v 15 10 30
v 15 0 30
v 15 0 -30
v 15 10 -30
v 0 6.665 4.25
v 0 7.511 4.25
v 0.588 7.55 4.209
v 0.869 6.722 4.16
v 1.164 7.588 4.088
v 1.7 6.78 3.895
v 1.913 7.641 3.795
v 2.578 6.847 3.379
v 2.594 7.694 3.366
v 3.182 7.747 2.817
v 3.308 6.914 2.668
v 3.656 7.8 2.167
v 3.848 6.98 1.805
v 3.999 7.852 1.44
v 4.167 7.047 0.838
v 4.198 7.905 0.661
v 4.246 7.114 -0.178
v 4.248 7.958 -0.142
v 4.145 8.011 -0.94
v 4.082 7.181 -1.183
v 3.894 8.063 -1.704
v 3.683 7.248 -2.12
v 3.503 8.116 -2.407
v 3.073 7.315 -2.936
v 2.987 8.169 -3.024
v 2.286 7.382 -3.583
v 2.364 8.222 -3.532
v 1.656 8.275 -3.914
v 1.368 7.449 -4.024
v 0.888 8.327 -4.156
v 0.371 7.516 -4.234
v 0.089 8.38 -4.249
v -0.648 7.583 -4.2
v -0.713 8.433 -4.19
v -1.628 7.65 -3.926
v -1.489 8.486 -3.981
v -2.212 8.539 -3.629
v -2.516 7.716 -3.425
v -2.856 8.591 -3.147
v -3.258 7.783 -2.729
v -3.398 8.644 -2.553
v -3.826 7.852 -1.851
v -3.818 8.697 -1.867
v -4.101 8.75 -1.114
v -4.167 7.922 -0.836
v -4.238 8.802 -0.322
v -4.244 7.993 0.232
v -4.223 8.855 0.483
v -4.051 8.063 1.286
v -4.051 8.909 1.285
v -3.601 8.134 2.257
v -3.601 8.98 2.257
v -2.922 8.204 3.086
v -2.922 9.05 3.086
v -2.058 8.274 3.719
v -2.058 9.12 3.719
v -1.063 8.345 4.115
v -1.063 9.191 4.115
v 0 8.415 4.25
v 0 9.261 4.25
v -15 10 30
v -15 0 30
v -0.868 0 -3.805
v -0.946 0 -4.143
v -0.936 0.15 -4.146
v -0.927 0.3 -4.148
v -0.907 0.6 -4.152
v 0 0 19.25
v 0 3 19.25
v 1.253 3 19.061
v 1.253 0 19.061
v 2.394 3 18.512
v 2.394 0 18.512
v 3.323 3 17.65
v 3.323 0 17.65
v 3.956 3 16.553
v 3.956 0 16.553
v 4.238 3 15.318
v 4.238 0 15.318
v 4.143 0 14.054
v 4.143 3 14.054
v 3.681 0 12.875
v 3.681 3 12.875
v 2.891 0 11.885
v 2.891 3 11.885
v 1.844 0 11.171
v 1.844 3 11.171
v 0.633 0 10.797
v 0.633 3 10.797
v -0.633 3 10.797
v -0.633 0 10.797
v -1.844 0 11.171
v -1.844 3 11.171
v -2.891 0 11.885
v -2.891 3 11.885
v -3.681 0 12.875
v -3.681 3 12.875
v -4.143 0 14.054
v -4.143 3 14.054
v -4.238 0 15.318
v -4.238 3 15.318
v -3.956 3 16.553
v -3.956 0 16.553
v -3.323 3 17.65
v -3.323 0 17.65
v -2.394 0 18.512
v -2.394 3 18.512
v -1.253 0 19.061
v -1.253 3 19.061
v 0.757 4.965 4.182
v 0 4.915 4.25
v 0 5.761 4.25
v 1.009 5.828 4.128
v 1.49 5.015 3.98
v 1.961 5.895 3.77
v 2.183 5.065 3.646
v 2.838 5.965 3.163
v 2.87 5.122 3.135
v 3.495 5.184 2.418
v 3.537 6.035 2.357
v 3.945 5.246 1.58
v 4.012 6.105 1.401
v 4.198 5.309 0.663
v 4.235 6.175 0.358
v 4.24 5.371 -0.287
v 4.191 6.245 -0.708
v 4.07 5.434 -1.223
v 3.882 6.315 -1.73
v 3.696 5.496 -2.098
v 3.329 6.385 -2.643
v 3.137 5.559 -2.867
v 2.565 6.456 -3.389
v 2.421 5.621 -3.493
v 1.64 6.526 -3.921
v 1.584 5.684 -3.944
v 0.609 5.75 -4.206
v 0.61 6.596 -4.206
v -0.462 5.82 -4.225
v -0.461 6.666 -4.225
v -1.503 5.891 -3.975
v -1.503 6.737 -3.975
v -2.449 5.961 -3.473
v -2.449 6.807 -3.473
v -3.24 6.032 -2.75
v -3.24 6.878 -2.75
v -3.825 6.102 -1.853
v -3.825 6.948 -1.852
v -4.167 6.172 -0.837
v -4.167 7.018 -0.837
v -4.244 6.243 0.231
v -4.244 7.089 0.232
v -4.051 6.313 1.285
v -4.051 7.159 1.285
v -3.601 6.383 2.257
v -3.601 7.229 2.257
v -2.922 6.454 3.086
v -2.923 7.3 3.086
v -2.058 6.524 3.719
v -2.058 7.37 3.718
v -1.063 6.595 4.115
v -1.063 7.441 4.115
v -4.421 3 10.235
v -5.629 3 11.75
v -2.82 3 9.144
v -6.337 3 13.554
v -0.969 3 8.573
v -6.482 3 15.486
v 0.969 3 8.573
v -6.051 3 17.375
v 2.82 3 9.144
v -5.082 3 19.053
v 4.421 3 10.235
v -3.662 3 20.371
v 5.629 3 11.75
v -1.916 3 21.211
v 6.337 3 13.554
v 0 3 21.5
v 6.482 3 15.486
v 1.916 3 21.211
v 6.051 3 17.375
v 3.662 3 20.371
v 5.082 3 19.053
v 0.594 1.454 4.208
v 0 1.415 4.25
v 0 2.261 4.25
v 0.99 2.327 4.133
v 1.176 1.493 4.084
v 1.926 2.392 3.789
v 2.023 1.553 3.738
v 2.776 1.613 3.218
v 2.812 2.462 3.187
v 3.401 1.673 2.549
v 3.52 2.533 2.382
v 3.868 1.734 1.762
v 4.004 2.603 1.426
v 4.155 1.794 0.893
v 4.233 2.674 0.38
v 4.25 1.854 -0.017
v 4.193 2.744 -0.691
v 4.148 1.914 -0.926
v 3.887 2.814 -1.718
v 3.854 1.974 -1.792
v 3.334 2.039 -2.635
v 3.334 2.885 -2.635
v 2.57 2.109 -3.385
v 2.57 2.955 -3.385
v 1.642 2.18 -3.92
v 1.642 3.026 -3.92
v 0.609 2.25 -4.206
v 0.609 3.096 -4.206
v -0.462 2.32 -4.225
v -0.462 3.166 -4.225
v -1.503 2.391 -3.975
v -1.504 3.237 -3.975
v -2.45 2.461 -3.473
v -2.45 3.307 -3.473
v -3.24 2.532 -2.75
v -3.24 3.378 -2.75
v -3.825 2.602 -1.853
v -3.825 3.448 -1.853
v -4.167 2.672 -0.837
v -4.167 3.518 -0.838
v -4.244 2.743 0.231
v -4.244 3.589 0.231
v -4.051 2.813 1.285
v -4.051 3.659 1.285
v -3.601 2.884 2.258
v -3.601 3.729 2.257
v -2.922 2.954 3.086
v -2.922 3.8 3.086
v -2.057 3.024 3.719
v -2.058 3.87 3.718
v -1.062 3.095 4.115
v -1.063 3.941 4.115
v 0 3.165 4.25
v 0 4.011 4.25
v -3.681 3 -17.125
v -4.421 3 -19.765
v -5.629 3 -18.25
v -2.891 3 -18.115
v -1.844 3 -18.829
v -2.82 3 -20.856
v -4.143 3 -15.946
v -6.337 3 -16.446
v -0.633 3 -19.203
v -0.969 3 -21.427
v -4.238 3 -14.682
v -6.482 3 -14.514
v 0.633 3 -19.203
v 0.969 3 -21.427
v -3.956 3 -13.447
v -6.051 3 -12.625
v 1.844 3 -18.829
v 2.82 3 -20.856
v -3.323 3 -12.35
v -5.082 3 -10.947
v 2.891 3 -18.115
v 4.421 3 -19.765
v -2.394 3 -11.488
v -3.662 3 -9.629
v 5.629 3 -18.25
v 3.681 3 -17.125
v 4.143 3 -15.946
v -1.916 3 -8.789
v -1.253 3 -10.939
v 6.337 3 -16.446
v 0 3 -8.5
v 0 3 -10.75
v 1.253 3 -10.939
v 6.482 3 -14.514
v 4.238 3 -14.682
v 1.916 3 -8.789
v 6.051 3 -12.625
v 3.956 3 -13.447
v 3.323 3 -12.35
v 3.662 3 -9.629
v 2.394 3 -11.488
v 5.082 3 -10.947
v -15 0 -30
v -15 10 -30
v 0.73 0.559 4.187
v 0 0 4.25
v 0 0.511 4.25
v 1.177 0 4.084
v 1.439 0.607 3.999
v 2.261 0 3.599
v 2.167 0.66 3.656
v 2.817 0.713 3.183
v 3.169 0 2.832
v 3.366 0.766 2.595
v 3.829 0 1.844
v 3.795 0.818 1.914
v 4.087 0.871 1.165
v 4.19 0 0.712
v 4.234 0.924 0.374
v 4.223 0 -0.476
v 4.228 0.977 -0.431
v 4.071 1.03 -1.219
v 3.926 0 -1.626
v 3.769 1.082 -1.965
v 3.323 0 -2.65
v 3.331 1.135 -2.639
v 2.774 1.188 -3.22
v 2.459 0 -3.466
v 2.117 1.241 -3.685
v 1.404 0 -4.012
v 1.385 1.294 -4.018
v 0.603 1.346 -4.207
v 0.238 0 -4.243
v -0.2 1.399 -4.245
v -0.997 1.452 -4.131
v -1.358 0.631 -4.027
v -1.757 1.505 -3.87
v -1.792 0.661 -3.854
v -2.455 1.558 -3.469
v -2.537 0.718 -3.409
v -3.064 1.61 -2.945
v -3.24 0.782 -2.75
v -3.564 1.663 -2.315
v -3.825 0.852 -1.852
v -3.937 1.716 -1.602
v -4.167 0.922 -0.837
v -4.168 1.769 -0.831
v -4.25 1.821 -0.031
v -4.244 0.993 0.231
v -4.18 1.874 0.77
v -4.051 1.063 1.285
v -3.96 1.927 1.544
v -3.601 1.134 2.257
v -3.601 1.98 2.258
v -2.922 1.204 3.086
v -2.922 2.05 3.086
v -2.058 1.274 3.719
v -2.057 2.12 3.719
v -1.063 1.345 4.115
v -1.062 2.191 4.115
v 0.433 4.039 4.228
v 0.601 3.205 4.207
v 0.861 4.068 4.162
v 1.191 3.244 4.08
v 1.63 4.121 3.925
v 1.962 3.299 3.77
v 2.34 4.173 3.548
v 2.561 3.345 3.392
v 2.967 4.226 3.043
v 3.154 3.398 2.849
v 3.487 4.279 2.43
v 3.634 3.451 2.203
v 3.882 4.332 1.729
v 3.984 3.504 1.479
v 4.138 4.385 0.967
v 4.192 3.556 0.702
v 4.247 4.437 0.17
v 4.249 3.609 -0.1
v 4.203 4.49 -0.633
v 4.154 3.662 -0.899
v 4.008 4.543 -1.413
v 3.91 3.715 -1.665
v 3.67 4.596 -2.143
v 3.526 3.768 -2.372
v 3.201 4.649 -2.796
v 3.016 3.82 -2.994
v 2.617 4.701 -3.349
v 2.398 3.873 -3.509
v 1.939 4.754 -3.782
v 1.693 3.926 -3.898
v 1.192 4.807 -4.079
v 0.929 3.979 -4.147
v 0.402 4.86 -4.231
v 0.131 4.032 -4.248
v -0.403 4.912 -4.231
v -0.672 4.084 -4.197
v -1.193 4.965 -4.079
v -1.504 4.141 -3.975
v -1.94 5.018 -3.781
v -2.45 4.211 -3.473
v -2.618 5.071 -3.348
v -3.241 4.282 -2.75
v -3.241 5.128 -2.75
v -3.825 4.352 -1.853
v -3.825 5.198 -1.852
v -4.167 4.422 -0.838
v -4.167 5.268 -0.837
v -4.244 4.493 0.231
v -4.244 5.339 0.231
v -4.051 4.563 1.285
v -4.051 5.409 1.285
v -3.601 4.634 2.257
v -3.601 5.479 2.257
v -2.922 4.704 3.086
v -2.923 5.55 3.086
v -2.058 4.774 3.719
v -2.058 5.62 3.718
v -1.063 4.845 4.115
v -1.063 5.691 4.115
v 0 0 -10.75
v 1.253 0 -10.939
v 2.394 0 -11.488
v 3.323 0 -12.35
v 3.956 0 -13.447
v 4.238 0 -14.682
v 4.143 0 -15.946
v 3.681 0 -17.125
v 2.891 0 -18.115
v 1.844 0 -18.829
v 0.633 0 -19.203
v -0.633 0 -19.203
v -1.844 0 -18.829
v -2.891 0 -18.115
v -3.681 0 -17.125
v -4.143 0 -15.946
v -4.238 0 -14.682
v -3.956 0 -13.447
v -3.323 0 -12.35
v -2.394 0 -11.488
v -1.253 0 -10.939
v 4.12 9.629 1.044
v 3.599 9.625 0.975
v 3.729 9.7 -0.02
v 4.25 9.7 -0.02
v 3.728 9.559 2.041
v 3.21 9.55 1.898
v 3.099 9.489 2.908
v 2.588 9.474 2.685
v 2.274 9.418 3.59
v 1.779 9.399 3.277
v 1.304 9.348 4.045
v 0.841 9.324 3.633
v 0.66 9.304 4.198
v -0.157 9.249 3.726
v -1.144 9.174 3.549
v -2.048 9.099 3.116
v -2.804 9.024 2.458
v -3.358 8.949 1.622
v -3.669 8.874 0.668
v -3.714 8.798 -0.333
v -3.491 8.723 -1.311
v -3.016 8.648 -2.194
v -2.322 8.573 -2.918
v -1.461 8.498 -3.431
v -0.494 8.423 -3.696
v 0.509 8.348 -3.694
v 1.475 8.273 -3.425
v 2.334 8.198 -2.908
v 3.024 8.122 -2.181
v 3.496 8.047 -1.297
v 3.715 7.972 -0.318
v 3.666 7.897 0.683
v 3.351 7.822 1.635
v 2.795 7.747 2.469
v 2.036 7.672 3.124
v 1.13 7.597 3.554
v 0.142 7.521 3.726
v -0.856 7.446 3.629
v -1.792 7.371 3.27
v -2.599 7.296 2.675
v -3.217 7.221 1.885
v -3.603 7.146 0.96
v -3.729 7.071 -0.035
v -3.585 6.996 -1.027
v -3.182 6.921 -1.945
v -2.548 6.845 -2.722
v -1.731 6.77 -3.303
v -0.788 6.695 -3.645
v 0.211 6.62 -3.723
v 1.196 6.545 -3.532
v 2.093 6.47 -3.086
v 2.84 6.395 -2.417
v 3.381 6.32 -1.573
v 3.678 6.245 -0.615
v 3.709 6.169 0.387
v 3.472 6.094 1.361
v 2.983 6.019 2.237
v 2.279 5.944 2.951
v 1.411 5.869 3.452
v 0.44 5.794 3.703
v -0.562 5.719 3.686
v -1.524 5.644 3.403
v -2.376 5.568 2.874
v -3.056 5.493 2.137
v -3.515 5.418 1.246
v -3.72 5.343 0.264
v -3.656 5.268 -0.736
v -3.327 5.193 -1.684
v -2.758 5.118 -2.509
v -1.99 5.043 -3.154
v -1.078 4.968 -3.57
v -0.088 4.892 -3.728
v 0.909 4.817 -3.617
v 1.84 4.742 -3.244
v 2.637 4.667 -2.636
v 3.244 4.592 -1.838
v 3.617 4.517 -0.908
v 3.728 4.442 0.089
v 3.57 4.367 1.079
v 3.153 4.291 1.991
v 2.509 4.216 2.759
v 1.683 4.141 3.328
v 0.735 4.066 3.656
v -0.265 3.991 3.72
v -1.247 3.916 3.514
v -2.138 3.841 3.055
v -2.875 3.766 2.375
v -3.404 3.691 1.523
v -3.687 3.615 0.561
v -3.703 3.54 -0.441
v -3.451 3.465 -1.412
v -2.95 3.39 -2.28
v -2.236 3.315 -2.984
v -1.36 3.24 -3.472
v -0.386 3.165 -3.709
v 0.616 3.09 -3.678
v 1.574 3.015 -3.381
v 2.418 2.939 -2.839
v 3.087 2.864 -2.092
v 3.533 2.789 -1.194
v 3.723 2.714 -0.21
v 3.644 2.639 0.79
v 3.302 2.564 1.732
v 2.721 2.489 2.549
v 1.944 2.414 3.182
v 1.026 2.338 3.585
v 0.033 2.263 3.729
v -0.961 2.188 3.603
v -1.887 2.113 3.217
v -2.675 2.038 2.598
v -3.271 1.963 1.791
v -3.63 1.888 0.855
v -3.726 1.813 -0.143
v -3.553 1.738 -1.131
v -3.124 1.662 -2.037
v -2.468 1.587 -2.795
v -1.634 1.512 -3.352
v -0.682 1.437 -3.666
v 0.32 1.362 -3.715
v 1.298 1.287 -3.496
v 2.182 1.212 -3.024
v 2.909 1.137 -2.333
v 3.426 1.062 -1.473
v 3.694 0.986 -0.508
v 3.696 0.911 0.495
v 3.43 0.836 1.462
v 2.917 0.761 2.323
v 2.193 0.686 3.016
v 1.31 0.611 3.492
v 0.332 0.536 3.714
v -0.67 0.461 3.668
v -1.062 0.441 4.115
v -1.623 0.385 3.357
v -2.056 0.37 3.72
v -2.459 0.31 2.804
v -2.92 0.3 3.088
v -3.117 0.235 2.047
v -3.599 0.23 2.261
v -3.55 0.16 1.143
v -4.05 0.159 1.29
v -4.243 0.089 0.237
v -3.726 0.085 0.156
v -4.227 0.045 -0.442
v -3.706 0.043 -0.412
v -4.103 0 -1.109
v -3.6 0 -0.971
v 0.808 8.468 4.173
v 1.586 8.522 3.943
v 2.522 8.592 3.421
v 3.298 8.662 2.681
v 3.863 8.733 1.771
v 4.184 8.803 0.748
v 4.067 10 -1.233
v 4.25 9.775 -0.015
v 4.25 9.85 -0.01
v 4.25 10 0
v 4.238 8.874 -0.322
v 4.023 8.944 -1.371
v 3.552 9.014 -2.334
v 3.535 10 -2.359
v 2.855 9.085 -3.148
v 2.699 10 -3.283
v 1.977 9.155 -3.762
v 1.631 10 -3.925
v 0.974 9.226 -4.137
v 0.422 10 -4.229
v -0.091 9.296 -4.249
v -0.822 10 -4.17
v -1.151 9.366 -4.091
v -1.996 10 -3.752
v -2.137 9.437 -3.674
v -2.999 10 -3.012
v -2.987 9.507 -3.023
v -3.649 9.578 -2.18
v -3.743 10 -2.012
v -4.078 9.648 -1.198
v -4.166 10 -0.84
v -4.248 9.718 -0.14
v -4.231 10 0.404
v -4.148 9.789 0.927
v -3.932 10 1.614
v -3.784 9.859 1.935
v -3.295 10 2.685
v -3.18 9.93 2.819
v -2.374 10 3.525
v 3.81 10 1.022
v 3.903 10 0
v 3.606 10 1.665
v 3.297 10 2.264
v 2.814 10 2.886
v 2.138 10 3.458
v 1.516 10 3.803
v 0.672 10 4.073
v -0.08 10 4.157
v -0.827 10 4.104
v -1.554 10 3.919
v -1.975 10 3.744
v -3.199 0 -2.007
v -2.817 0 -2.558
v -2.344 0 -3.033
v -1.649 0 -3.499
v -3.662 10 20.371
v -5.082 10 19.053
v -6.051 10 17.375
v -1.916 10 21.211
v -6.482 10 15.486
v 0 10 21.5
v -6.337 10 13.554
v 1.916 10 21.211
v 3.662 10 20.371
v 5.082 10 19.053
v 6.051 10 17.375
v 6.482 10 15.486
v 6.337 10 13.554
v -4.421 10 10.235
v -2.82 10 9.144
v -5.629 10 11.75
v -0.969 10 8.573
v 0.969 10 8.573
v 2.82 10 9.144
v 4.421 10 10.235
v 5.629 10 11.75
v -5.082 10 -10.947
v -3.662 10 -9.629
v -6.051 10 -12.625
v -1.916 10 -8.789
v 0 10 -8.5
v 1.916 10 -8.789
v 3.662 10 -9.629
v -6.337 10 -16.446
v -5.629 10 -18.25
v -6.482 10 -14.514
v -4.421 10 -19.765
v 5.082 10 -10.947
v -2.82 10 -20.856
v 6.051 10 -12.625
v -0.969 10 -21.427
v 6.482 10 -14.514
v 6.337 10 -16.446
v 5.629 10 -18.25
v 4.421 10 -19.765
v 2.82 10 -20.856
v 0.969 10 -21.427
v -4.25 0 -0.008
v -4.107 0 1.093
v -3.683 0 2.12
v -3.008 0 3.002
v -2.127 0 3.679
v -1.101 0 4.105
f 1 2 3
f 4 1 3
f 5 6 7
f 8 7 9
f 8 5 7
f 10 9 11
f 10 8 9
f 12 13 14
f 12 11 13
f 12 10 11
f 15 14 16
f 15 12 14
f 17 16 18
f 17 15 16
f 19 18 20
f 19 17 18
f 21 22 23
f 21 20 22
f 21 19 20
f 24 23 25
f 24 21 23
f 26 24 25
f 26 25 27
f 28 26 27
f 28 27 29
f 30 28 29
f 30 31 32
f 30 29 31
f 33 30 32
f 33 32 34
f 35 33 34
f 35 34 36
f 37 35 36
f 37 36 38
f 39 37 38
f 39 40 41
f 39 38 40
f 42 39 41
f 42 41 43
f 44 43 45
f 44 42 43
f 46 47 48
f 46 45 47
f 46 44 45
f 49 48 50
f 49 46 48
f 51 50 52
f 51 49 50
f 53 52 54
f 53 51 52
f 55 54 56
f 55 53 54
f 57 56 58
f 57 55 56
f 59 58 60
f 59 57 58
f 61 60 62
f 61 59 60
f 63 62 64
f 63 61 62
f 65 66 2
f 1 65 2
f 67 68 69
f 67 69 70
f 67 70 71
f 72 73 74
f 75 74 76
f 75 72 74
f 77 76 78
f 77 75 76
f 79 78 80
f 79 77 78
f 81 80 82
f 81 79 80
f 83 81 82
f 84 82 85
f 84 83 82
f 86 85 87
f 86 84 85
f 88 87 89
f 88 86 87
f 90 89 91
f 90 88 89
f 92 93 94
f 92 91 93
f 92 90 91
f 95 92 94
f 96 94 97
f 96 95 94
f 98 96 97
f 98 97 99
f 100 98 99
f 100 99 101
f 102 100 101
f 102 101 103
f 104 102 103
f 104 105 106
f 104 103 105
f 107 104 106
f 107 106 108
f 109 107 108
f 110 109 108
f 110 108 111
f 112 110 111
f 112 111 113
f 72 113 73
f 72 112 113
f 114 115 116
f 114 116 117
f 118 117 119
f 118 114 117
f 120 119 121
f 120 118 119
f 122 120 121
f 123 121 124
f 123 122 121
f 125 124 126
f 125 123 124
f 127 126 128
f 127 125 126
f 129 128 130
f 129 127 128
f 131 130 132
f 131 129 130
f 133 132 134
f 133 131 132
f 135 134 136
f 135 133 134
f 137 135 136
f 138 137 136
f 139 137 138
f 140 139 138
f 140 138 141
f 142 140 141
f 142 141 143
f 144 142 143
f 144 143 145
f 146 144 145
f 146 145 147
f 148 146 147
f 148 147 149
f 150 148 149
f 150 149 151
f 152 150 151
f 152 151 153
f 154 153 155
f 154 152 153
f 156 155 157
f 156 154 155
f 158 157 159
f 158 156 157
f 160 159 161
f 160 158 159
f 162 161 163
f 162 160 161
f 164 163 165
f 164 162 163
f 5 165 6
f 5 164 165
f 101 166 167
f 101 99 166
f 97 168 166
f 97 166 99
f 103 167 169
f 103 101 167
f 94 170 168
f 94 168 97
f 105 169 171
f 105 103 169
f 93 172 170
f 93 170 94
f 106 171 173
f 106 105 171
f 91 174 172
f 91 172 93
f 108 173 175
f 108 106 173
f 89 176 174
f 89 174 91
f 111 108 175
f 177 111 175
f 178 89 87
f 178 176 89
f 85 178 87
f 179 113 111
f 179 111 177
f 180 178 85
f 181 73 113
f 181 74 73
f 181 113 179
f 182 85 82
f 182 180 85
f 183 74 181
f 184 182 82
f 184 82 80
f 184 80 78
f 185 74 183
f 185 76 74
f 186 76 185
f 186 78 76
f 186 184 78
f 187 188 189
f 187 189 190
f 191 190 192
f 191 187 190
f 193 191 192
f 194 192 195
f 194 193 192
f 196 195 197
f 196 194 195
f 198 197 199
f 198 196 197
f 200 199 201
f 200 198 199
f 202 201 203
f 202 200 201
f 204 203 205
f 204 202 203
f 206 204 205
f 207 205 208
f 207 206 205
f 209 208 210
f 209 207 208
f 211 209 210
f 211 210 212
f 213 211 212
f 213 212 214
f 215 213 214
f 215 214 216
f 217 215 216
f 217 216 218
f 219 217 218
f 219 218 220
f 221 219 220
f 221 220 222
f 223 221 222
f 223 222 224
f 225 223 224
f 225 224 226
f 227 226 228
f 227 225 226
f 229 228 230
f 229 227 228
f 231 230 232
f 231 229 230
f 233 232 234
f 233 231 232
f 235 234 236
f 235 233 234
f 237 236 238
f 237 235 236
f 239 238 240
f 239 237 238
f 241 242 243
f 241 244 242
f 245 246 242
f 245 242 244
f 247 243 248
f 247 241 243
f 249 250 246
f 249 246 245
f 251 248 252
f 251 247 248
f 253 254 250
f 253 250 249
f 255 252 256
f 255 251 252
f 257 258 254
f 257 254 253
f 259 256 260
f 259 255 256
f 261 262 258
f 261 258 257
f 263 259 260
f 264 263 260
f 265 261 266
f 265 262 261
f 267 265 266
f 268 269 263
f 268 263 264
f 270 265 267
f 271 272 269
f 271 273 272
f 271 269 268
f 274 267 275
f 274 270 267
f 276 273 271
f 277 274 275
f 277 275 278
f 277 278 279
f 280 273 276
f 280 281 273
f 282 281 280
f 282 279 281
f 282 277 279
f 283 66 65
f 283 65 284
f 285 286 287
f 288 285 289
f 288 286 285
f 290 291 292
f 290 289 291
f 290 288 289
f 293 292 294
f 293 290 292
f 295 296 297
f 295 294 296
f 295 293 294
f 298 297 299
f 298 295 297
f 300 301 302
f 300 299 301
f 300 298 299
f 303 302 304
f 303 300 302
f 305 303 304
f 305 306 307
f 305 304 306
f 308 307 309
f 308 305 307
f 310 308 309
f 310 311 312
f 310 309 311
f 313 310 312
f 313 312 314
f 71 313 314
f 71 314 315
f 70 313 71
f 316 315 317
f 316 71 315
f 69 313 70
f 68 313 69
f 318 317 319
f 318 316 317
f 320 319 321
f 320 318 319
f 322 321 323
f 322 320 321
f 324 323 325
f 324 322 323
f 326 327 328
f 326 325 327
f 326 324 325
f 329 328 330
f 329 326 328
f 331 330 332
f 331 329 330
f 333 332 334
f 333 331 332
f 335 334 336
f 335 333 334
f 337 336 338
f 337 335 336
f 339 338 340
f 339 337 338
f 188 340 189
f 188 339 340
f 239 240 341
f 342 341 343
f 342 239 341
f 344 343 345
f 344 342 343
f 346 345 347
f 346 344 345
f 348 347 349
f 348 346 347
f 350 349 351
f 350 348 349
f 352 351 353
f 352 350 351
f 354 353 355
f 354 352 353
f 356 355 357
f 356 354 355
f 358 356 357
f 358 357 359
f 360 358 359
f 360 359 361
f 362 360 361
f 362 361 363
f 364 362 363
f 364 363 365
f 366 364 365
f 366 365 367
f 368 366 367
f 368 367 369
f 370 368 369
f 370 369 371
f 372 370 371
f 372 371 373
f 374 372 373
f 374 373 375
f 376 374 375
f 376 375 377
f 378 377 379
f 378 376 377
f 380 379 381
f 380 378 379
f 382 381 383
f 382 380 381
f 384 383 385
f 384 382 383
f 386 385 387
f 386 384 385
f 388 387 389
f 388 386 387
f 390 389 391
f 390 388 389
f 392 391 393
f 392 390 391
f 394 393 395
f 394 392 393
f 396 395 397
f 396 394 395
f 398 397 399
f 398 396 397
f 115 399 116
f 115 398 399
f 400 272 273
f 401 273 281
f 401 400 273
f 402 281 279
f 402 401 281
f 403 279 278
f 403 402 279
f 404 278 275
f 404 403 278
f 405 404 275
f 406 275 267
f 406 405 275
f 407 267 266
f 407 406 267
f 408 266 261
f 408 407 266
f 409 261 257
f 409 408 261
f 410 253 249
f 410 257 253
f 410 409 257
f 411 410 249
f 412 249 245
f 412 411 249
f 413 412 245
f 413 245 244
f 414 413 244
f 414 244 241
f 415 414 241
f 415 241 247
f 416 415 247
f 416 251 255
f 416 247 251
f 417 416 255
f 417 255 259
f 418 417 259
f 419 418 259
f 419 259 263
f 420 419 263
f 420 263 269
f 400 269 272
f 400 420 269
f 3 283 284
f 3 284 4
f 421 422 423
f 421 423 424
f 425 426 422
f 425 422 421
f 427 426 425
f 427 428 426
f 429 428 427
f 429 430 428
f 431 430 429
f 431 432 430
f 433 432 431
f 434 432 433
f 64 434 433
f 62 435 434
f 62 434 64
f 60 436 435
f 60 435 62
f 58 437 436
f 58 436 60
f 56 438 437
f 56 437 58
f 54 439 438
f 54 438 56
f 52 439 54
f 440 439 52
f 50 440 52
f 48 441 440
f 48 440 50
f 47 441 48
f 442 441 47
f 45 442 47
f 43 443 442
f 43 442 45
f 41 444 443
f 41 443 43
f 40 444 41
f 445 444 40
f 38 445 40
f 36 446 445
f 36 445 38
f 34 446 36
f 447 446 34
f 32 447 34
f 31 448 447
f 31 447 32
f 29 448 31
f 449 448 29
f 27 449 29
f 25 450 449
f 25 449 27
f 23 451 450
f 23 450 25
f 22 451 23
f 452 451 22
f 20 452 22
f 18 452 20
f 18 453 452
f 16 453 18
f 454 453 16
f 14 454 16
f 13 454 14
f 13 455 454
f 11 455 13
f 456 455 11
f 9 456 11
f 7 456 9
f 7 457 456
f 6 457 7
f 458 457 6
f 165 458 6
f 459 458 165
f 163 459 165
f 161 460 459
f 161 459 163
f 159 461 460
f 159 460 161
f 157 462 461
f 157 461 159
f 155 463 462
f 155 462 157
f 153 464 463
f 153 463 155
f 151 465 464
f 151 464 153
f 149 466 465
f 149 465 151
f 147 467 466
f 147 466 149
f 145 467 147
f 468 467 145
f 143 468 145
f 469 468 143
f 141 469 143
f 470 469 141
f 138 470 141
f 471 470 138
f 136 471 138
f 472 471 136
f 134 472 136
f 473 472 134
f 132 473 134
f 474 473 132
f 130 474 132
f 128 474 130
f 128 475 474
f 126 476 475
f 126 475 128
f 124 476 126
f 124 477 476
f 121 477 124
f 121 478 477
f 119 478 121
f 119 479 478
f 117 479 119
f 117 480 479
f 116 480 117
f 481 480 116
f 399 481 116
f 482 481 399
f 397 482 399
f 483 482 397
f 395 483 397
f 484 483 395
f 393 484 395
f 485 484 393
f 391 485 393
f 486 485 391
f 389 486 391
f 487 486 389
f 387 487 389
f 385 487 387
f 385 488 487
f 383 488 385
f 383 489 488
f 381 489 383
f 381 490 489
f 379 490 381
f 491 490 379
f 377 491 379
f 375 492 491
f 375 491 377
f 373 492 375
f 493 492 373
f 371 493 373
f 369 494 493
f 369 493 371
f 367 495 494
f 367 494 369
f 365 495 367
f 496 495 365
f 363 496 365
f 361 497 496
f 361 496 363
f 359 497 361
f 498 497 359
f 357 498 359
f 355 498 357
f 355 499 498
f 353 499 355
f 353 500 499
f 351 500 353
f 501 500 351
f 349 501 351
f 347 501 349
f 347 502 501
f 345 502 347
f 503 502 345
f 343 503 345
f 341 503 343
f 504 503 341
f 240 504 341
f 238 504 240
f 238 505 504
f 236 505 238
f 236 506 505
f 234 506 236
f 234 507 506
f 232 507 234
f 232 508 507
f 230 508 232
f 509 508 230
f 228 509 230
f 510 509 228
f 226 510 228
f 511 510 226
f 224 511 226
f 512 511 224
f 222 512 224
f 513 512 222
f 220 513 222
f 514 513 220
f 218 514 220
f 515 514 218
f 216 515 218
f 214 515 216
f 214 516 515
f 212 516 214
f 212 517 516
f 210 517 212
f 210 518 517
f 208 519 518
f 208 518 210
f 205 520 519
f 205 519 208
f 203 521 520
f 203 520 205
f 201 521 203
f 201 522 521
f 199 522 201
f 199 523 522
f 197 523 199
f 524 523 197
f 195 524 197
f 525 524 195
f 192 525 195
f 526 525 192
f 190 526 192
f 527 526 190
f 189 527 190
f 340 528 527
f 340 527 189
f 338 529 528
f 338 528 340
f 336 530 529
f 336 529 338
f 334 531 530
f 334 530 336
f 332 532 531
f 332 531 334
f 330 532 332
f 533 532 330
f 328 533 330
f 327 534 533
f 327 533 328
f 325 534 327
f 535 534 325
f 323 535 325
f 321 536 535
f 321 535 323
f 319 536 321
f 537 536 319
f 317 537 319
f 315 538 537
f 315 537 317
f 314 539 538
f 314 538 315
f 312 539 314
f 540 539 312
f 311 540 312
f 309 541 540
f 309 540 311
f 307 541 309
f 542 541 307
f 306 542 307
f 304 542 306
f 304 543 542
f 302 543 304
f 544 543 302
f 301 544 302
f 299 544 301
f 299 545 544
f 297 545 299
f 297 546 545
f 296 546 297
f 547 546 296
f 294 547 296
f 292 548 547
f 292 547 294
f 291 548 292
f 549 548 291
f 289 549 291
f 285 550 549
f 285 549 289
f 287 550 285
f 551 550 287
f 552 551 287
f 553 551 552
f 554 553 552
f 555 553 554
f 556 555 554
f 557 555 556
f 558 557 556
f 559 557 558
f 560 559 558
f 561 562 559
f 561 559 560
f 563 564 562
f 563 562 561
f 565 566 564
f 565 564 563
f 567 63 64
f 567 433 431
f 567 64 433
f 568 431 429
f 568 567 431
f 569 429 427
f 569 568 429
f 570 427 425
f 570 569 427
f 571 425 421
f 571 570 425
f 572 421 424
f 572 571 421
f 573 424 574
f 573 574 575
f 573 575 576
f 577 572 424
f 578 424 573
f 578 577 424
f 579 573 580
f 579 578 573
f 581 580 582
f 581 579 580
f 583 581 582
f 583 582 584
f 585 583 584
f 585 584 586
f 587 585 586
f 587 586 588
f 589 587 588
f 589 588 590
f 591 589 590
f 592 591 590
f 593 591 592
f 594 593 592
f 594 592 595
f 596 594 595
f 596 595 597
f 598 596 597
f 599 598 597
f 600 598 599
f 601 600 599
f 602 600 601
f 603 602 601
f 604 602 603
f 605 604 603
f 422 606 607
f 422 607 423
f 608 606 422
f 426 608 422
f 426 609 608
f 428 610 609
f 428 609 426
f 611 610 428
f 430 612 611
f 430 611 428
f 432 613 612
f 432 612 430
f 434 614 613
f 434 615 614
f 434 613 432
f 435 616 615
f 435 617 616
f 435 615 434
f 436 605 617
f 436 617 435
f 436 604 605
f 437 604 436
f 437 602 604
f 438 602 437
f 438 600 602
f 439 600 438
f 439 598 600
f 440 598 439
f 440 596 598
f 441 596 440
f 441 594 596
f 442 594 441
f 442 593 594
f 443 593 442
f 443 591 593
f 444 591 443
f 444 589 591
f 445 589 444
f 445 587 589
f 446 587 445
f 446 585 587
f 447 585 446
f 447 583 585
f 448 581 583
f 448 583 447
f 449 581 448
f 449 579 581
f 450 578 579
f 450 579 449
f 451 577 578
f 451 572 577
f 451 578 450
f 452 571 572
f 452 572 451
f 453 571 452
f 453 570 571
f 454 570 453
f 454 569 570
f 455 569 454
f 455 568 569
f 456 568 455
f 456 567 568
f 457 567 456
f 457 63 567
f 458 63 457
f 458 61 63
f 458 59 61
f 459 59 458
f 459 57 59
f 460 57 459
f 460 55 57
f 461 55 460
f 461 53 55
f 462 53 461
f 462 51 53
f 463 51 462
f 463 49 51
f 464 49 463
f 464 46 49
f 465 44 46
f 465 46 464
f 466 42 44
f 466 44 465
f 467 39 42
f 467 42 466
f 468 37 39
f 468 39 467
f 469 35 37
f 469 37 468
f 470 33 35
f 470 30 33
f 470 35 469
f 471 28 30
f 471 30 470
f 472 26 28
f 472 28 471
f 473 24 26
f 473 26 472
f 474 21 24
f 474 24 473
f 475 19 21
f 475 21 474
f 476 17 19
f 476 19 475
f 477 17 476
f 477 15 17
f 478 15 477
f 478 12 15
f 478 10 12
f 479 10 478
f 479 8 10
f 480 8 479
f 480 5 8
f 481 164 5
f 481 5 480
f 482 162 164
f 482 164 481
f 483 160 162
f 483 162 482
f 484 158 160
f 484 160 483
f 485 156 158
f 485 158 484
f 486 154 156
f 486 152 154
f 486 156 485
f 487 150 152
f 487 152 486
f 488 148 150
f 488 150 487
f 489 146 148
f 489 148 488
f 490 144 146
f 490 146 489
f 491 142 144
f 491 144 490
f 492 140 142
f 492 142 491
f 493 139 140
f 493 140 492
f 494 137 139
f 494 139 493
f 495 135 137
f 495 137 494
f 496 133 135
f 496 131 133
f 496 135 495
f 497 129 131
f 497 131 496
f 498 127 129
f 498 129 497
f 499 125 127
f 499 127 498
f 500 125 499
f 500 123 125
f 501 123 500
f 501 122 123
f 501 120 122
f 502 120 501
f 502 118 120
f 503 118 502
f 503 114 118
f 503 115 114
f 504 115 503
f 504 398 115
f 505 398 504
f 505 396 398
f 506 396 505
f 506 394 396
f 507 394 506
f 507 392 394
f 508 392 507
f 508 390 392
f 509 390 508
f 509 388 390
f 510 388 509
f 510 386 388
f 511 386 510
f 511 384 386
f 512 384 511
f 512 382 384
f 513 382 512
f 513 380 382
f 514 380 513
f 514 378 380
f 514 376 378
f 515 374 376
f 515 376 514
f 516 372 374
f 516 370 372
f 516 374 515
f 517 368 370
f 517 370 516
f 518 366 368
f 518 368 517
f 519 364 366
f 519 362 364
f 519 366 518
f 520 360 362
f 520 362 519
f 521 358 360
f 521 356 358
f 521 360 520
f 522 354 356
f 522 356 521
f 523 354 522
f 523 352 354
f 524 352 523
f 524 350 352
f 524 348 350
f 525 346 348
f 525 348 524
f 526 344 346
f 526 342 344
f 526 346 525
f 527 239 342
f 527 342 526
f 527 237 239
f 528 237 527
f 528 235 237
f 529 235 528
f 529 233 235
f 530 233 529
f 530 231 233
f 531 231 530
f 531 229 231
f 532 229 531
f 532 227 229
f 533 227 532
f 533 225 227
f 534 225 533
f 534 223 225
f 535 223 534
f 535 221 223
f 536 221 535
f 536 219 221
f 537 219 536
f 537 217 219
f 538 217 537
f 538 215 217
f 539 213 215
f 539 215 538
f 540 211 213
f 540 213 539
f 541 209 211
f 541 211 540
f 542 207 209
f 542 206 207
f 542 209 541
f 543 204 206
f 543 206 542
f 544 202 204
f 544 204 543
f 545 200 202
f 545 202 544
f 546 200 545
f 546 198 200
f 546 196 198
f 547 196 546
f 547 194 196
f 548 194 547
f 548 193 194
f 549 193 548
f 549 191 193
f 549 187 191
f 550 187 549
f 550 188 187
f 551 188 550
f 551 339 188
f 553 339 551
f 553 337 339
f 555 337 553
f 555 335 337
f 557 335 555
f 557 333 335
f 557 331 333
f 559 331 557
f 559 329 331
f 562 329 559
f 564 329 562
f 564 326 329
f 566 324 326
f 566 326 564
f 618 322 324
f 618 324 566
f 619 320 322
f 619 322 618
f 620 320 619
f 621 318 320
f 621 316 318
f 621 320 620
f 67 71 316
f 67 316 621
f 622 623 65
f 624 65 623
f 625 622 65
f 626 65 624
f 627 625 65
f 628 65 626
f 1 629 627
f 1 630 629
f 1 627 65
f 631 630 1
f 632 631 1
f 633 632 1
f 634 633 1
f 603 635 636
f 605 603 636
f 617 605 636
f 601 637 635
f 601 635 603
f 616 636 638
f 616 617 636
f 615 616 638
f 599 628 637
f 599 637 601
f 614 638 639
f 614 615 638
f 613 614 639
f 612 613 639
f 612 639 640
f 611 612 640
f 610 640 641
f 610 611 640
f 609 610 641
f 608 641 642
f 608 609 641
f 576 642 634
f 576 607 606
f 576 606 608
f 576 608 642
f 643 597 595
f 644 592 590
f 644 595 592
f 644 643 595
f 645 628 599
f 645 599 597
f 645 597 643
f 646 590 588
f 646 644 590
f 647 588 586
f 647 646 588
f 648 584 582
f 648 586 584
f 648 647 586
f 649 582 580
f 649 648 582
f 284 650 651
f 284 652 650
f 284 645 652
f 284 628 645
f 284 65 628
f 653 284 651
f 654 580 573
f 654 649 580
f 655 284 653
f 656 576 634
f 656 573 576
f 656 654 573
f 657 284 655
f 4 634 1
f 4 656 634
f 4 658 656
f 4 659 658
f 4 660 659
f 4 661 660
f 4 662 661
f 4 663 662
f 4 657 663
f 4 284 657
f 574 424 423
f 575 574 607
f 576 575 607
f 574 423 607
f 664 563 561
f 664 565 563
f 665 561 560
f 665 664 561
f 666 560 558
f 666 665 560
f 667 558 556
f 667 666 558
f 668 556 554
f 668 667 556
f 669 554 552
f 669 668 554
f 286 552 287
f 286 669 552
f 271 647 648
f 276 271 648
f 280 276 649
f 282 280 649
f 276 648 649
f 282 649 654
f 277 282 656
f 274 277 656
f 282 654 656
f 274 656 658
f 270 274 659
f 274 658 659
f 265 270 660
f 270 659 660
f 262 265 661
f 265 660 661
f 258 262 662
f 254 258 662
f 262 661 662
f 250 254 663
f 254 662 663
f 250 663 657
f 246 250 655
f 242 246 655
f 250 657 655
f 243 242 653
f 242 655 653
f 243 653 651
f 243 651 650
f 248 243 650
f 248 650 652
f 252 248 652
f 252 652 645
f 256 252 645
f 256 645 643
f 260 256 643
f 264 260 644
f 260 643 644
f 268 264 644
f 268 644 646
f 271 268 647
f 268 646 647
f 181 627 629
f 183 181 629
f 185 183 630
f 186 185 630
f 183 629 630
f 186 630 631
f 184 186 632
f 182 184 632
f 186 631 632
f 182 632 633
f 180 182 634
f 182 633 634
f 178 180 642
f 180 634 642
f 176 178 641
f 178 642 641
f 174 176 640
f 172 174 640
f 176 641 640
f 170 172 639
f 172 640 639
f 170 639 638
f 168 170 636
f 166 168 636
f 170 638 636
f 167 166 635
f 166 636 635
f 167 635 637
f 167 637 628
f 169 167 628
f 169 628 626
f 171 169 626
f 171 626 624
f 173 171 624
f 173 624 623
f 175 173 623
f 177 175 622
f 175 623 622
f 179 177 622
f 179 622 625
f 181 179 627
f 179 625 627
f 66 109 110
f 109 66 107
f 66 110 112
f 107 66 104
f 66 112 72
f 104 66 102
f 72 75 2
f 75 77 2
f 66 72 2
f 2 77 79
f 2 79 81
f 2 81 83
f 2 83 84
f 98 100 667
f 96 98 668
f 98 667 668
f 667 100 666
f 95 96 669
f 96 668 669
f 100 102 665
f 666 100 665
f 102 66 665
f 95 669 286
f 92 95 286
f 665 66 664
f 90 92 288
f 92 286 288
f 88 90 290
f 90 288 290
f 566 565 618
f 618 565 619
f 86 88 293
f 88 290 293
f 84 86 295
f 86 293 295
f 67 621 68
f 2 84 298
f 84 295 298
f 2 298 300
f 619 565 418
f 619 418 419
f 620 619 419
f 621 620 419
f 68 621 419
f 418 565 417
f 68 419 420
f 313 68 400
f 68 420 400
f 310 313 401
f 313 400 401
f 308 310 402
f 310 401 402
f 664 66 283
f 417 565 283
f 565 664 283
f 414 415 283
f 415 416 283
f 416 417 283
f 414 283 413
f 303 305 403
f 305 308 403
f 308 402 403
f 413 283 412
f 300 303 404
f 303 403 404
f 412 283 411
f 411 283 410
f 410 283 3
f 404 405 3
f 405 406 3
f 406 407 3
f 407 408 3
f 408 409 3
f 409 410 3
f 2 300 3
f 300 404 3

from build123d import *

# Parameters (mm, degrees)
SKETCH_1_W          = 30
SKETCH_1_H          = 60
SKETCH_1_R          = 4.25
EXTRUDE_1_DEPTH     = 10
SKETCH_3_R          = 6.5
CUT_EXTRUDE_1_DEPTH = 7
SWEEP_1_PITCH       = 1.75
SWEEP_1_HEIGHT      = 10
SWEEP_1_RADIUS      = 4.25
SWEEP_1_START_ANGLE = 90
SKETCH_6_W          = 30
SKETCH_6_H          = 9.258755221
SKETCH_6_H_2        = 12.64673583
CUT_EXTRUDE_2_DEPTH = 63.748440843


with BuildPart() as part:
    # 草图1 → 凸台-拉伸1 (new body)
    with BuildSketch(Plane(origin=(0, 0, 0), x_dir=(1, 0, 0), z_dir=(0, 1, 0))):
        Rectangle(SKETCH_1_W, SKETCH_1_H)
        with Locations(Location((0, 15, 0), (0, 0, 270))):
            Circle(SKETCH_1_R, mode=Mode.SUBTRACT)
        with Locations(Location((0, -15, 0), (0, 0, 270))):
            Circle(SKETCH_1_R, mode=Mode.SUBTRACT)
        with Locations(Location((0, 0, 0), (0, 0, 270))):
            Circle(SKETCH_1_R, mode=Mode.SUBTRACT)
    extrude(amount=EXTRUDE_1_DEPTH)

    # 草图3 → 切除-拉伸1 (cut)
    with BuildSketch(Plane(origin=(0, 10, 0), x_dir=(1, 0, 0), z_dir=(0, 1, 0))):
        with Locations(Location((0, 15, 0), (0, 0, 270))):
            Circle(SKETCH_3_R)
        with Locations(Location((0, -15, 0), (0, 0, 270))):
            Circle(SKETCH_3_R)
    extrude(amount=-CUT_EXTRUDE_1_DEPTH, mode=Mode.SUBTRACT)

    # 扫描1: sweep along a helix
    with BuildLine() as sweep_1_path:
        add(Helix(SWEEP_1_PITCH, SWEEP_1_HEIGHT, SWEEP_1_RADIUS, center=(0, 10, 0), direction=(0, -1, 0), mode=Mode.PRIVATE).rotate(Axis((0, 10, 0), (0, -1, 0)), SWEEP_1_START_ANGLE))
    # 草图5 → 扫描1 (sweep)
    with BuildSketch(Plane(origin=(4.25, 10, 0), x_dir=(1, 0, 0), z_dir=(3.1170229136343766e-15, -0.06539411290163802, 0.9978595141590864))):
        Polygon((0, 0.601609008), (-0.521008684, -0.300804504), (0.521008684, -0.300804504), align=None)
    sweep(path=sweep_1_path.line, is_frenet=True)

    # 草图6 → 切除-拉伸2 (cut, through all)
    with BuildSketch(Plane.XY.offset(30)):
        with Locations((0, 14.629377611)):
            Rectangle(SKETCH_6_W, SKETCH_6_H)
        with Locations((0, -6.323367915)):
            Rectangle(SKETCH_6_W, SKETCH_6_H_2)
    extrude(amount=-CUT_EXTRUDE_2_DEPTH, mode=Mode.SUBTRACT)


solid = part.part
